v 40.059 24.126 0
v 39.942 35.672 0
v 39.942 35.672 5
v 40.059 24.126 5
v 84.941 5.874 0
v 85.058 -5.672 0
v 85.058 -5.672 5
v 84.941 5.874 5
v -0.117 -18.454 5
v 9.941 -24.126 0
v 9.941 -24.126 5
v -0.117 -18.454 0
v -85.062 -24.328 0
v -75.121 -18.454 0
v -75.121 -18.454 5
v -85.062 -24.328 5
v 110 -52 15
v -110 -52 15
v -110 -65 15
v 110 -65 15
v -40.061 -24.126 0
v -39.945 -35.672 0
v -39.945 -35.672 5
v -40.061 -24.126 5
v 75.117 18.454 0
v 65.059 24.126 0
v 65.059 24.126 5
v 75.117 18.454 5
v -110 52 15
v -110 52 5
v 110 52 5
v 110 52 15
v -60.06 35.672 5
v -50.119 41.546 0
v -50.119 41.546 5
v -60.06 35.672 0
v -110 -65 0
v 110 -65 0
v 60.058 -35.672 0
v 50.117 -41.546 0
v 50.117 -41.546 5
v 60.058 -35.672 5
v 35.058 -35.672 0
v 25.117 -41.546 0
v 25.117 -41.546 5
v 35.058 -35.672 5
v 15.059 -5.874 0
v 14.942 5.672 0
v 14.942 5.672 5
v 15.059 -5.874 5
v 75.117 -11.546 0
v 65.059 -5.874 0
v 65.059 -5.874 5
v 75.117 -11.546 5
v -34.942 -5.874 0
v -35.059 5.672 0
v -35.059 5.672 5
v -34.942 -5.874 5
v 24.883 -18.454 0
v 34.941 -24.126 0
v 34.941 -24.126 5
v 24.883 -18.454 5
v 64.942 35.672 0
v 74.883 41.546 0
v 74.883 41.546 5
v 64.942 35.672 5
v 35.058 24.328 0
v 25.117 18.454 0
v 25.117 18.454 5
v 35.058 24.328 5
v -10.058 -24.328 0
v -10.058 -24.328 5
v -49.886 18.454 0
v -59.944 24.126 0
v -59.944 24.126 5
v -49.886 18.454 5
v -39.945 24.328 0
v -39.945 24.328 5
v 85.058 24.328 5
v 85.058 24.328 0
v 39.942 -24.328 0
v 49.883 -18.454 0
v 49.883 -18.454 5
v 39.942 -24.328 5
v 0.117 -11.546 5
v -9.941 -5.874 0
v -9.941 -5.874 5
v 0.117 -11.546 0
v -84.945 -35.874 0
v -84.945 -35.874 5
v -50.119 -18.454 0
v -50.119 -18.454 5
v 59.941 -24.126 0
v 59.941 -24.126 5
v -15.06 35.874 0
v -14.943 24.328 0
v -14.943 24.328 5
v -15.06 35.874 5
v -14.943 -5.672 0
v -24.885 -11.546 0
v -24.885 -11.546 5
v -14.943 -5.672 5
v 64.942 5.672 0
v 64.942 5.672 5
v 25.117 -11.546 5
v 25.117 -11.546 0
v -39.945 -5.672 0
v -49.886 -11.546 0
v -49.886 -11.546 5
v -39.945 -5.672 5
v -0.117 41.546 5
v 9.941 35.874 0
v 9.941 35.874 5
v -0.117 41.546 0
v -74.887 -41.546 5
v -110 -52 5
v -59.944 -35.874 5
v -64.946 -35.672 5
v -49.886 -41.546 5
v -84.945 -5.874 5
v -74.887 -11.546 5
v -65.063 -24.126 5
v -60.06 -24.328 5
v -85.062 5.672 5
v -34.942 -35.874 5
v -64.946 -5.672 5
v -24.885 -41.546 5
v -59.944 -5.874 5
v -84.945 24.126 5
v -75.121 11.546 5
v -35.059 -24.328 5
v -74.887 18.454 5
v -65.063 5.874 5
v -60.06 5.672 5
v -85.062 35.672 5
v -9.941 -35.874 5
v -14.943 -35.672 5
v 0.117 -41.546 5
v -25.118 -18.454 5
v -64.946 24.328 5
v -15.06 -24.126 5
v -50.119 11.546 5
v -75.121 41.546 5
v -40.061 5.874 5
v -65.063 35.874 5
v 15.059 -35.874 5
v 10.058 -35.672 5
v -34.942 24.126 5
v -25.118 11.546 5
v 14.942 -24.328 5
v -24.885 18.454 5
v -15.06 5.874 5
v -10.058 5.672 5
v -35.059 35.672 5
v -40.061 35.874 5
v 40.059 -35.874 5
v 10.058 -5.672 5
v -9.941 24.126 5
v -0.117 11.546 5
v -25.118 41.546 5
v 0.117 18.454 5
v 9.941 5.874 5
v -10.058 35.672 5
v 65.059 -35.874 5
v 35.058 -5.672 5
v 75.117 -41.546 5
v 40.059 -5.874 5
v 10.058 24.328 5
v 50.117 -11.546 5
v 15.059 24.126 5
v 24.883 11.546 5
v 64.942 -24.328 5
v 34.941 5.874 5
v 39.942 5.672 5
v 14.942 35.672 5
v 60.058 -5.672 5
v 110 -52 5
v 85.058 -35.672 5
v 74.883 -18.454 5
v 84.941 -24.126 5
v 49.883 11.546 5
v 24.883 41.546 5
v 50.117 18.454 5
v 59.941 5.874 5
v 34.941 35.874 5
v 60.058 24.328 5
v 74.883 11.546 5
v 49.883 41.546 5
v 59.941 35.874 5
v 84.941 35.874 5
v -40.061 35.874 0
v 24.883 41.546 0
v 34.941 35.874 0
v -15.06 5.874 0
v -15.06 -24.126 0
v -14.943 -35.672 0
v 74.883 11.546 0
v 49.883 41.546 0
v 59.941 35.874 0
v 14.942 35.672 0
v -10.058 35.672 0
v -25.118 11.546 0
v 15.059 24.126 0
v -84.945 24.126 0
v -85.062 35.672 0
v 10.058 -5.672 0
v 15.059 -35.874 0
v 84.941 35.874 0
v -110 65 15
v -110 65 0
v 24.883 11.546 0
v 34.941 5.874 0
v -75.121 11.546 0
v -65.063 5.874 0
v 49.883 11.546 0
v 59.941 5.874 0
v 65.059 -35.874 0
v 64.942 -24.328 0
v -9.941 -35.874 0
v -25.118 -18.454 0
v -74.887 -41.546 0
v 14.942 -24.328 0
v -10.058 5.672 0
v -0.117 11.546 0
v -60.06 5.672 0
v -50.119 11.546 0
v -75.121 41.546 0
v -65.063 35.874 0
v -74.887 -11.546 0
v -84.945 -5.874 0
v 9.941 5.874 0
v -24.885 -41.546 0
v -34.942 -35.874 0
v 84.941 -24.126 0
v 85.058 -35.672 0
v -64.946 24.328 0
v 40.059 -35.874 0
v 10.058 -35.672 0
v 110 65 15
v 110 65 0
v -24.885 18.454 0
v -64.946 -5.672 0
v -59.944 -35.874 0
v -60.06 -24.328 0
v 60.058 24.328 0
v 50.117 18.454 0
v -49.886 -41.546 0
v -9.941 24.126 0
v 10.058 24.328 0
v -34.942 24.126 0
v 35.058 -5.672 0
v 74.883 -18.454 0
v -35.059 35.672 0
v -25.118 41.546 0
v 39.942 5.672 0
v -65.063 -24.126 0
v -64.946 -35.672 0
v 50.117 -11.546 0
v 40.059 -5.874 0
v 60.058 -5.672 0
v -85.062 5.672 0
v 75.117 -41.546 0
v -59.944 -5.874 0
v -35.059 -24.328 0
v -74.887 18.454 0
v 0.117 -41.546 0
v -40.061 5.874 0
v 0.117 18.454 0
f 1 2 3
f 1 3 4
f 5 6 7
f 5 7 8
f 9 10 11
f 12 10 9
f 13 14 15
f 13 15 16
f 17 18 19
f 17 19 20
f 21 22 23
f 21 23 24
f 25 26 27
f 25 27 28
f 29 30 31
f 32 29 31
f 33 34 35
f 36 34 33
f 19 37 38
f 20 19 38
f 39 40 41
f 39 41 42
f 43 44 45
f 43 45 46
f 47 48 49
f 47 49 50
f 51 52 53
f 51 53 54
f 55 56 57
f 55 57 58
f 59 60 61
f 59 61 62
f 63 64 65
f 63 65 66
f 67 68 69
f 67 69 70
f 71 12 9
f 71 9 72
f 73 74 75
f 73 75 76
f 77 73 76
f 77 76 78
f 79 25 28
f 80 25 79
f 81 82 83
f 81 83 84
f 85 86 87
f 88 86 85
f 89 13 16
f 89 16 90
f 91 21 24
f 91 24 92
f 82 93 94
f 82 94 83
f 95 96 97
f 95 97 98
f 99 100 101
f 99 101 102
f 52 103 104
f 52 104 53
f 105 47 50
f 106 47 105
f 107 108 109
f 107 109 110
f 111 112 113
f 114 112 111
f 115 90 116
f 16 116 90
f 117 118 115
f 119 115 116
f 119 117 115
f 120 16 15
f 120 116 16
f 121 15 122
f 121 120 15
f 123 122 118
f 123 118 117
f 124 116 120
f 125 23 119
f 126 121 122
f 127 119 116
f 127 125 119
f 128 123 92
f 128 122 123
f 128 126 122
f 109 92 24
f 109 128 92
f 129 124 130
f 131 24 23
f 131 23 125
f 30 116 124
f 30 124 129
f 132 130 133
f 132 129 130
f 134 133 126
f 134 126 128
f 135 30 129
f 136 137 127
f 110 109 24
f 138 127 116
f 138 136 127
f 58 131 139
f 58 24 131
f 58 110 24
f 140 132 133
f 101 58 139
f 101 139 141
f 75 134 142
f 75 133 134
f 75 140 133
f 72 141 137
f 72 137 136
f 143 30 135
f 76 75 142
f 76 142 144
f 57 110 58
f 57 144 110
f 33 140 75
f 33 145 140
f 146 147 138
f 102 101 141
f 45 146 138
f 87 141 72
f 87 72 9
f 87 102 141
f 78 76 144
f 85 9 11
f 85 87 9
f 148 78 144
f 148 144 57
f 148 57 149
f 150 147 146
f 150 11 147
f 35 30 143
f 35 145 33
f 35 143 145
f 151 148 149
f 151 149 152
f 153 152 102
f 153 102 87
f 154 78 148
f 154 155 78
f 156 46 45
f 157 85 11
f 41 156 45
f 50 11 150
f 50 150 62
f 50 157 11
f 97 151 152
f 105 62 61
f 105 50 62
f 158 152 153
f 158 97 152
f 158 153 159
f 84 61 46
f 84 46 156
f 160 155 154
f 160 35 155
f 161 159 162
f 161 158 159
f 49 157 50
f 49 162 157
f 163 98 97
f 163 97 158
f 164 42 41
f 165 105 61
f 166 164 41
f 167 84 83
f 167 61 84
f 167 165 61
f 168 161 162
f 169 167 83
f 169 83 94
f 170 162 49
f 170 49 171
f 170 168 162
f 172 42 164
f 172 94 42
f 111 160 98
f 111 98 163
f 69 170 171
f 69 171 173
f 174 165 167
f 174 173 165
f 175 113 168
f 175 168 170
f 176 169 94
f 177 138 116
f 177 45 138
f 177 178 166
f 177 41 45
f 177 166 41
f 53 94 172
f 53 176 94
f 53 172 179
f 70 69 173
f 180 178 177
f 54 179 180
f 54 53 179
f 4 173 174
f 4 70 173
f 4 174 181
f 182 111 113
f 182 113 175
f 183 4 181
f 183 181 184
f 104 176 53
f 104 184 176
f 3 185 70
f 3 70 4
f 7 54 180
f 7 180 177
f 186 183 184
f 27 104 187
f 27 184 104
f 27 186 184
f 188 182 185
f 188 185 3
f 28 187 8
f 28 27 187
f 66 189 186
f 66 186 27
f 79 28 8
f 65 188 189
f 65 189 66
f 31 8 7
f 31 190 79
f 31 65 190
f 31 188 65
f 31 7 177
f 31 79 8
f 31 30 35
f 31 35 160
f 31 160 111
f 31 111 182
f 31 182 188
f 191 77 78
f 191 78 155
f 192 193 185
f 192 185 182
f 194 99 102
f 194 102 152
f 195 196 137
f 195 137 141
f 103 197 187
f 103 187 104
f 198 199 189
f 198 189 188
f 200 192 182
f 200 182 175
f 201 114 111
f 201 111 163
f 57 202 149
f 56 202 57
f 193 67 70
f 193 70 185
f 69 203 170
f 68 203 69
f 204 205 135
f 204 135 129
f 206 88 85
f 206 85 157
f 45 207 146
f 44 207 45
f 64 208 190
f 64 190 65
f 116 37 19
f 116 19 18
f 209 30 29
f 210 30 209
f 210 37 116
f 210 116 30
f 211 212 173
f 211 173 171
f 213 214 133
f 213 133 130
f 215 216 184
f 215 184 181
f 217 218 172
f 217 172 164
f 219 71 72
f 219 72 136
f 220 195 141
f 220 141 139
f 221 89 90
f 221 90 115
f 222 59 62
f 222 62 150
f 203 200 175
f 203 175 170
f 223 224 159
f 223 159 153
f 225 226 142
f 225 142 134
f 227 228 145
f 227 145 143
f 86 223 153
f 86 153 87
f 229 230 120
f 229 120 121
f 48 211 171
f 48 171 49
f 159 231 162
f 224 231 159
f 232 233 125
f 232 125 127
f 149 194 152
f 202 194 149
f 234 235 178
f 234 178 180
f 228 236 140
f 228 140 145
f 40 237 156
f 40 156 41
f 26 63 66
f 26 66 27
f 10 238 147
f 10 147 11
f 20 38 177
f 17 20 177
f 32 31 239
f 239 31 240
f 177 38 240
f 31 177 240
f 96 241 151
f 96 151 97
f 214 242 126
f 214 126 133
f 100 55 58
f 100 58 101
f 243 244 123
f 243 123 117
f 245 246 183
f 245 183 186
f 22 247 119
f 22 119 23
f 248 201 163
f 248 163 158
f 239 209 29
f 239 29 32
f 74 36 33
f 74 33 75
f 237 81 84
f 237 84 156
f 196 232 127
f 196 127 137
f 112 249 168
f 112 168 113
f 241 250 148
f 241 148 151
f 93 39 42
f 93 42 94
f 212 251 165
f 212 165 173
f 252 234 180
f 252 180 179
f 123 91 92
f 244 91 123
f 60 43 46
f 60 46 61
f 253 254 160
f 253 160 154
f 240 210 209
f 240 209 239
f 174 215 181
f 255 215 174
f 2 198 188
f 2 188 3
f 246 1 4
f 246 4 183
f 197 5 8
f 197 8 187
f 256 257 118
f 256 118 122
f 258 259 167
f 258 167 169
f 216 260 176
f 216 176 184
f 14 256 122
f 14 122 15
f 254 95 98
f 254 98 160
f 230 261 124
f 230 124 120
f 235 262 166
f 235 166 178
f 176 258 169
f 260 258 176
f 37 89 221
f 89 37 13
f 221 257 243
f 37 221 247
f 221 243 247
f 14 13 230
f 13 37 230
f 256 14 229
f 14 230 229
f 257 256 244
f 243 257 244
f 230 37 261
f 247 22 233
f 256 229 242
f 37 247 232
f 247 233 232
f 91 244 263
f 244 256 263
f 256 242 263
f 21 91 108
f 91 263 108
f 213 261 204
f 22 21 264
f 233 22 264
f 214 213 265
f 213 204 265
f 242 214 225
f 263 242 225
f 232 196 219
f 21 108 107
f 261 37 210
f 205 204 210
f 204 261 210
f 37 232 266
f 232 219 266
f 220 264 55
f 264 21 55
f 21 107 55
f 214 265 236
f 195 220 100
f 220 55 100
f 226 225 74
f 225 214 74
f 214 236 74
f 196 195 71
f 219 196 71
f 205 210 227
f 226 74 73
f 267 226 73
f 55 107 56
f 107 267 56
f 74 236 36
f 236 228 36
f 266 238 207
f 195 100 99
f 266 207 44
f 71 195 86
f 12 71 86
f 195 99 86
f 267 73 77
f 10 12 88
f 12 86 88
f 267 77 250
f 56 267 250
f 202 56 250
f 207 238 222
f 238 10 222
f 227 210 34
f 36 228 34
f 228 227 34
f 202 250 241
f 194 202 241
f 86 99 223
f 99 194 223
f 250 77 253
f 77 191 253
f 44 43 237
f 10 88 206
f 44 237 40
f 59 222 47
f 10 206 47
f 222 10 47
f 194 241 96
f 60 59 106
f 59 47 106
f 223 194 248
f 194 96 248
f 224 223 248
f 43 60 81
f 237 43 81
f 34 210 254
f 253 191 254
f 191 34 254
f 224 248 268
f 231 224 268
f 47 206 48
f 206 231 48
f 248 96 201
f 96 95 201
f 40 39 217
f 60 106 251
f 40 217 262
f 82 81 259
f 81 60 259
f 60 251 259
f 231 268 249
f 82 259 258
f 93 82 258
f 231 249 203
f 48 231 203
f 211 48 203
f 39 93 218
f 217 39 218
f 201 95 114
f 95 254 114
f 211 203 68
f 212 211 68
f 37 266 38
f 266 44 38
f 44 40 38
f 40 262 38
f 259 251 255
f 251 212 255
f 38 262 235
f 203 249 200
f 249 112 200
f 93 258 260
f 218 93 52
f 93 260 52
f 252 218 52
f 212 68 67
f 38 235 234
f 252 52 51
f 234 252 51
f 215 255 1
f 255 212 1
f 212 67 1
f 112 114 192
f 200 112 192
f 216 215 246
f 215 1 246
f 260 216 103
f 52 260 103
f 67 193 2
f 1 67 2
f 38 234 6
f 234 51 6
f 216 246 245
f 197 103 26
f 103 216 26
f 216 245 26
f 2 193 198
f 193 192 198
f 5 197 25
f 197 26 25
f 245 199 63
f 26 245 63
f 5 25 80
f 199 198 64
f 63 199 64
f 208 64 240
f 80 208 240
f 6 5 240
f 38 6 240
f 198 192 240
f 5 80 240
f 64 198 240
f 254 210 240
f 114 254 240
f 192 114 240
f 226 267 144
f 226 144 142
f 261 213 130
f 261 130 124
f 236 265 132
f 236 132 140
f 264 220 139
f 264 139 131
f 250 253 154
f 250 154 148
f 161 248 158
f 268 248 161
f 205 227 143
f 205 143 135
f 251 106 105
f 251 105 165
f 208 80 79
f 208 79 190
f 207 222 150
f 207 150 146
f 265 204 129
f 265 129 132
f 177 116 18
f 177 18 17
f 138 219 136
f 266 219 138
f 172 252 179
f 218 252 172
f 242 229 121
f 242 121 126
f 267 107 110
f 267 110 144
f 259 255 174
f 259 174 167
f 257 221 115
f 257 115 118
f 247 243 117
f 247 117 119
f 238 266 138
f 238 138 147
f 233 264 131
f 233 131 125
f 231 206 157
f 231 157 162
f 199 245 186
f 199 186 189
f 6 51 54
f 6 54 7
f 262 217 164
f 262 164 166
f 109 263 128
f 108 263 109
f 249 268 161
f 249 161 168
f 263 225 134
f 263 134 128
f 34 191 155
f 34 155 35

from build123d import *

# Parameters (mm, degrees)
SKETCH_3_W          = 220
SKETCH_3_H          = 130
EXTRUDE_1_DEPTH     = 5
CUT_EXTRUDE_1_DEPTH = 128.867118525
SKETCH_3_4_W        = 220
SKETCH_3_4_H        = 13
EXTRUDE_2_DEPTH     = 15


with BuildPart() as part:
    # Эскиз3 → Бобышка-Вытянуть1 (new body)
    with BuildSketch(Plane.XY):
        Rectangle(SKETCH_3_W, SKETCH_3_H)
    extrude(amount=EXTRUDE_1_DEPTH)

    # Эскиз3<3> → Вырез-Вытянуть1 (cut, through all)
    with BuildSketch(Plane.XY):
        Polygon((35.057854749, -5.672115229), (34.941123256, 5.874300106), (24.883268507, 11.546415335), (14.942145251, 5.672115229), (15.058876744, -5.874300106), (25.116731493, -11.546415335), align=None)
        Polygon((10.057854749, -5.672115229), (9.941123256, 5.874300106), (-0.116731493, 11.546415335), (-10.057854749, 5.672115229), (-9.941123256, -5.874300106), (0.116731493, -11.546415335), align=None)
        Polygon((60.057854749, -5.672115229), (59.941123256, 5.874300106), (49.883268507, 11.546415335), (39.942145251, 5.672115229), (40.058876744, -5.874300106), (50.116731493, -11.546415335), align=None)
        Polygon((85.057854749, -5.672115229), (84.941123256, 5.874300106), (74.883268507, 11.546415335), (64.942145251, 5.672115229), (65.058876744, -5.874300106), (75.116731493, -11.546415335), align=None)
        Polygon((-14.943422809, -5.672115229), (-15.060154302, 5.874300106), (-25.118009051, 11.546415335), (-35.059132307, 5.672115229), (-34.942400814, -5.874300106), (-24.884546065, -11.546415335), align=None)
        Polygon((-39.944700367, -5.672115229), (-40.06143186, 5.874300106), (-50.119286609, 11.546415335), (-60.060409866, 5.672115229), (-59.943678372, -5.874300106), (-49.885823623, -11.546415335), align=None)
        Polygon((-64.945977925, -5.672115229), (-65.062709418, 5.874300106), (-75.120564167, 11.546415335), (-85.061687424, 5.672115229), (-84.944955931, -5.874300106), (-74.887101181, -11.546415335), align=None)
        Polygon((-64.945977925, 24.327884771), (-65.062709418, 35.874300106), (-75.120564167, 41.546415335), (-85.061687424, 35.672115229), (-84.944955931, 24.125699894), (-74.887101181, 18.453584665), align=None)
        Polygon((-39.944700367, 24.327884771), (-40.06143186, 35.874300106), (-50.119286609, 41.546415335), (-60.060409866, 35.672115229), (-59.943678372, 24.125699894), (-49.885823623, 18.453584665), align=None)
        Polygon((-14.943422809, 24.327884771), (-15.060154302, 35.874300106), (-25.118009051, 41.546415335), (-35.059132307, 35.672115229), (-34.942400814, 24.125699894), (-24.884546065, 18.453584665), align=None)
        Polygon((10.057854749, 24.327884771), (9.941123256, 35.874300106), (-0.116731493, 41.546415335), (-10.057854749, 35.672115229), (-9.941123256, 24.125699894), (0.116731493, 18.453584665), align=None)
        Polygon((35.057854749, 24.327884771), (34.941123256, 35.874300106), (24.883268507, 41.546415335), (14.942145251, 35.672115229), (15.058876744, 24.125699894), (25.116731493, 18.453584665), align=None)
        Polygon((60.057854749, 24.327884771), (59.941123256, 35.874300106), (49.883268507, 41.546415335), (39.942145251, 35.672115229), (40.058876744, 24.125699894), (50.116731493, 18.453584665), align=None)
        Polygon((85.057854749, 24.327884771), (84.941123256, 35.874300106), (74.883268507, 41.546415335), (64.942145251, 35.672115229), (65.058876744, 24.125699894), (75.116731493, 18.453584665), align=None)
        Polygon((-39.944700367, -35.672115229), (-40.06143186, -24.125699894), (-50.119286609, -18.453584665), (-60.060409866, -24.327884771), (-59.943678372, -35.874300106), (-49.885823623, -41.546415335), align=None)
        Polygon((-14.943422809, -35.672115229), (-15.060154302, -24.125699894), (-25.118009051, -18.453584665), (-35.059132307, -24.327884771), (-34.942400814, -35.874300106), (-24.884546065, -41.546415335), align=None)
        Polygon((-64.945977925, -35.672115229), (-65.062709418, -24.125699894), (-75.120564167, -18.453584665), (-85.061687424, -24.327884771), (-84.944955931, -35.874300106), (-74.887101181, -41.546415335), align=None)
        Polygon((10.057854749, -35.672115229), (9.941123256, -24.125699894), (-0.116731493, -18.453584665), (-10.057854749, -24.327884771), (-9.941123256, -35.874300106), (0.116731493, -41.546415335), align=None)
        Polygon((35.057854749, -35.672115229), (34.941123256, -24.125699894), (24.883268507, -18.453584665), (14.942145251, -24.327884771), (15.058876744, -35.874300106), (25.116731493, -41.546415335), align=None)
        Polygon((60.057854749, -35.672115229), (59.941123256, -24.125699894), (49.883268507, -18.453584665), (39.942145251, -24.327884771), (40.058876744, -35.874300106), (50.116731493, -41.546415335), align=None)
        Polygon((75.116731493, -41.546415335), (85.057854749, -35.672115229), (84.941123256, -24.125699894), (74.883268507, -18.453584665), (64.942145251, -24.327884771), (65.058876744, -35.874300106), align=None)
    extrude(amount=CUT_EXTRUDE_1_DEPTH, mode=Mode.SUBTRACT)

    # Эскиз3<4> → Бобышка-Вытянуть2 (add)
    with BuildSketch(Plane.XY):
        with Locations((0, -58.5)):
            Rectangle(SKETCH_3_4_W, SKETCH_3_4_H)
        with Locations((0, 58.5)):
            Rectangle(SKETCH_3_4_W, SKETCH_3_4_H)
    extrude(amount=EXTRUDE_2_DEPTH)


solid = part.part
